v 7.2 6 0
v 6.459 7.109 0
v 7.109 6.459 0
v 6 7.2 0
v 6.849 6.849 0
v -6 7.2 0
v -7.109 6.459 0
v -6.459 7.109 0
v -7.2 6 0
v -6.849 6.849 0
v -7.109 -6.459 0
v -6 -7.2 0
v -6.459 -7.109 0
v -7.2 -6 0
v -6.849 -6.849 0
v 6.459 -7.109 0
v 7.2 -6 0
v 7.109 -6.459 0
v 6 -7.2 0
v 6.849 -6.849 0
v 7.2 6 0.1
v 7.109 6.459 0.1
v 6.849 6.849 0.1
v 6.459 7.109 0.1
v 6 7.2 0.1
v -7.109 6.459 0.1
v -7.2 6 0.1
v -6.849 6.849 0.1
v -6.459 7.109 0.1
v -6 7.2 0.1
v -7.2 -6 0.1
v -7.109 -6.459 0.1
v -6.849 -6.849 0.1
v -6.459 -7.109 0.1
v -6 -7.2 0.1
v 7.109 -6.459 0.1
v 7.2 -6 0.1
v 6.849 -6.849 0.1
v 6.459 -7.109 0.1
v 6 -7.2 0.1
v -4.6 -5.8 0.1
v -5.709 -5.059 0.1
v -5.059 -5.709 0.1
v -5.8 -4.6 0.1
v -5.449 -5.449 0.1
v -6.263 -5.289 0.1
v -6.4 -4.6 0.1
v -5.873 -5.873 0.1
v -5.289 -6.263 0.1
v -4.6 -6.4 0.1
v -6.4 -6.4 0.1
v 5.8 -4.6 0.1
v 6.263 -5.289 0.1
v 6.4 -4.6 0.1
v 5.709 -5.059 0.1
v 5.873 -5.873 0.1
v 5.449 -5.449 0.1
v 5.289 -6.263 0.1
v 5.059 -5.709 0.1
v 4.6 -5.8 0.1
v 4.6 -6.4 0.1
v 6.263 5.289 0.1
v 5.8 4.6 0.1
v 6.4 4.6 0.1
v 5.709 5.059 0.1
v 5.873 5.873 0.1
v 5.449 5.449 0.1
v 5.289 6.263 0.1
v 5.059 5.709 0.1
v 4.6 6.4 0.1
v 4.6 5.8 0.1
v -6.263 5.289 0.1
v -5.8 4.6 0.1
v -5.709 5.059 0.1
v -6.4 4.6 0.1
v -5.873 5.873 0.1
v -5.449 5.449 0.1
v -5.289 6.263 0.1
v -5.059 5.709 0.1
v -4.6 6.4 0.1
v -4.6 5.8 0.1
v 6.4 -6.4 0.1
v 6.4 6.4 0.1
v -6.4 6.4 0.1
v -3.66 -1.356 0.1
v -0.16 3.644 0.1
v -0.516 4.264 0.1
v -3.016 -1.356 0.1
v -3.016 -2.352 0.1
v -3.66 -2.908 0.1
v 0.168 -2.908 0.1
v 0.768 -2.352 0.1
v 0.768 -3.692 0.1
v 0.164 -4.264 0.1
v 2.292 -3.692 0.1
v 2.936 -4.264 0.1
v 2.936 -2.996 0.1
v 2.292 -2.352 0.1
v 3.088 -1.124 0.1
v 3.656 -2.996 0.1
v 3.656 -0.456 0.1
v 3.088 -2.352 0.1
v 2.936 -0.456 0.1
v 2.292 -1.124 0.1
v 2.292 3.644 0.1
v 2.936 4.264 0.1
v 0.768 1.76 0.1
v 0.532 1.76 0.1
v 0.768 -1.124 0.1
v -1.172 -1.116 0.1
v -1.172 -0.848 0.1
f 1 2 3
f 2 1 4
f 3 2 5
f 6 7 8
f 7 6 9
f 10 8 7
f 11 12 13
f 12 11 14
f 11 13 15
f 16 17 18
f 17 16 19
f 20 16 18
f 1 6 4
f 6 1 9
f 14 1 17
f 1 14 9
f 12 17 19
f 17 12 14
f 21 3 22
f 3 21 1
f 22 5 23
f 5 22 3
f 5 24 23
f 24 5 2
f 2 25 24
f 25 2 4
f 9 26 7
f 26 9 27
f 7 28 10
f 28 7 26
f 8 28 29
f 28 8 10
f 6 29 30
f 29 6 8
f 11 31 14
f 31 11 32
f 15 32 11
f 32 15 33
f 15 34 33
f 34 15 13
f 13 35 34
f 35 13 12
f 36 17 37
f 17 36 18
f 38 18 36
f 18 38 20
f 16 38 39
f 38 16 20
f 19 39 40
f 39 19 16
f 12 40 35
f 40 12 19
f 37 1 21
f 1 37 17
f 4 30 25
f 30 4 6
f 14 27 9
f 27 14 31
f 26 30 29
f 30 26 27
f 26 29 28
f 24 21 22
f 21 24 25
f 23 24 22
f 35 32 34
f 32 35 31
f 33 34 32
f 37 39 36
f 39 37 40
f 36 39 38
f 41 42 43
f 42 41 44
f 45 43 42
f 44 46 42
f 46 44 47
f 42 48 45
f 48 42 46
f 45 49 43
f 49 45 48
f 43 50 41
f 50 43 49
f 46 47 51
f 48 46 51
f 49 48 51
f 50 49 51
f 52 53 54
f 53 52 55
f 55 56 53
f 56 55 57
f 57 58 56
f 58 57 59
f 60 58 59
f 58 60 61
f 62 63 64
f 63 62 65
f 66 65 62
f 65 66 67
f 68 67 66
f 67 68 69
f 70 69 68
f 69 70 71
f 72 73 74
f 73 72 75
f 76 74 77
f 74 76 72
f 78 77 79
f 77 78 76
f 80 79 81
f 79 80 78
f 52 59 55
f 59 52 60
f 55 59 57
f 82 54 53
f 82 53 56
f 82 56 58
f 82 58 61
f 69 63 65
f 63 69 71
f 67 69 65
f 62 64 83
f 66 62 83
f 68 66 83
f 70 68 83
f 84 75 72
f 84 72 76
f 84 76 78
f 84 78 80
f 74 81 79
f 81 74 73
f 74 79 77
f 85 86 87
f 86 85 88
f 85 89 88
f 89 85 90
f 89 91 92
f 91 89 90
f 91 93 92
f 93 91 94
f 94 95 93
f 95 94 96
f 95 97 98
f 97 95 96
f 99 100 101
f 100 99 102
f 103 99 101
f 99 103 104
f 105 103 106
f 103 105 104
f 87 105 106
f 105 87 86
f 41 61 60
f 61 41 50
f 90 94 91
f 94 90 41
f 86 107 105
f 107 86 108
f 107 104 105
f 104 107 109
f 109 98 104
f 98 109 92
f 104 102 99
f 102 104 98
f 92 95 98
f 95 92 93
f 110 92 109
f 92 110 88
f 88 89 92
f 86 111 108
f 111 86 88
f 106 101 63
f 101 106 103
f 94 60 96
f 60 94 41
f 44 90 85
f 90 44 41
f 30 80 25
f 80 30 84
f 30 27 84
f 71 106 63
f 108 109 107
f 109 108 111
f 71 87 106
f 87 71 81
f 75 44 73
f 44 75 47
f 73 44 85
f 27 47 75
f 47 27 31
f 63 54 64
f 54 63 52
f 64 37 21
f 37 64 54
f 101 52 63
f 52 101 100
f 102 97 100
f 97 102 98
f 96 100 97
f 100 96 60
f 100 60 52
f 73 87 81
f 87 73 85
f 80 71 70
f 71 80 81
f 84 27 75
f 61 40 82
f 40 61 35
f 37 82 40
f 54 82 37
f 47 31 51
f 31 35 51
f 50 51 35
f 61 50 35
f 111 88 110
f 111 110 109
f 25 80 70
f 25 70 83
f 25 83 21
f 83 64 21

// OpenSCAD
// file: ../p/1-4cyli.scad
use <../lib.scad>
function ldraw_lib__1_4cyli() = [
// 0 Cylinder 0.25
// 0 Name: 1-4cyli.dat
// 0 Author: James Jessiman
// 0 !LDRAW_ORG Primitive UPDATE 2012-01
// 0 !LICENSE Licensed under CC BY 4.0 : see CAreadme.txt
// 
// 0 BFC CERTIFY CCW
  [0,"BFC","CERTIFY"],
  [0,"BFC","CCW"],
// 
// 0 !HISTORY 2002-03-23 [sbliss] Added BFC statement.
// 0 !HISTORY 2002-04-25 [PTadmin] Official Update 2002-02
// 0 !HISTORY 2007-06-22 [PTadmin] Header formatted for Contributor Agreement
// 0 !HISTORY 2008-07-01 [PTadmin] Official Update 2008-01
// 0 !HISTORY 2012-02-16 [Philo] Changed to CCW
// 0 !HISTORY 2012-03-30 [PTadmin] Official Update 2012-01
// 
// 
// 4 16 1 1 0 0.9239 1 0.3827 0.9239 0 0.3827 1 0 0
  [4,16,1,1,0,0.9239,1,0.3827,0.9239,0,0.3827,1,0,0],
// 5 24 1 0 0 1 1 0 0.9239 0 0.3827 1 0 -1
  [5,24,1,0,0,1,1,0,0.9239,0,0.3827,1,0,-1],
// 4 16 0.9239 1 0.3827 0.7071 1 0.7071 0.7071 0 0.7071 0.9239 0 0.3827
  [4,16,0.9239,1,0.3827,0.7071,1,0.7071,0.7071,0,0.7071,0.9239,0,0.3827],
// 5 24 0.9239 0 0.3827 0.9239 1 0.3827 0.7071 0 0.7071 1 0 0
  [5,24,0.9239,0,0.3827,0.9239,1,0.3827,0.7071,0,0.7071,1,0,0],
// 4 16 0.7071 1 0.7071 0.3827 1 0.9239 0.3827 0 0.9239 0.7071 0 0.7071
  [4,16,0.7071,1,0.7071,0.3827,1,0.9239,0.3827,0,0.9239,0.7071,0,0.7071],
// 5 24 0.7071 0 0.7071 0.7071 1 0.7071 0.3827 0 0.9239 0.9239 0 0.3827
  [5,24,0.7071,0,0.7071,0.7071,1,0.7071,0.3827,0,0.9239,0.9239,0,0.3827],
// 4 16 0.3827 1 0.9239 0 1 1 0 0 1 0.3827 0 0.9239
  [4,16,0.3827,1,0.9239,0,1,1,0,0,1,0.3827,0,0.9239],
// 5 24 0.3827 0 0.9239 0.3827 1 0.9239 0 0 1 0.7071 0 0.7071
  [5,24,0.3827,0,0.9239,0.3827,1,0.9239,0,0,1,0.7071,0,0.7071],
// 5 24 0 0 1 0 1 1 0.3827 0 0.9239 -1 0 1
  [5,24,0,0,1,0,1,1,0.3827,0,0.9239,-1,0,1],
];
module ldraw_lib__1_4cyli(step=0, col=false, unit=2/5, alt=false, line=0.2, solid=!$preview)
    makepoly(ldraw_lib__1_4cyli(), step=step, col=col, unit=unit, alt=alt, line=line, solid=solid);
ldraw_lib__1_4cyli(line=0.2);
// file: s/6237277as01.scad
use <../../lib.scad>
use <../../p/1-4chrd.scad>
use <../../p/1-4cyli.scad>
function ldraw_lib__s__6237277as01() = [
// 0 ~Sticker  1.8 x  1.8 without Top Surface
// 0 Name: s\6237277as01.dat
// 0 Author: Alex Herrera [alanbrito98]
// 0 !LDRAW_ORG Subpart UPDATE 2023-04
// 0 !LICENSE Licensed under CC BY 4.0 : see CAreadme.txt
// 
// 0 BFC CERTIFY CCW
  [0,"BFC","CERTIFY"],
  [0,"BFC","CCW"],
// 
// 0 !HISTORY 2023-08-25 [OrionP] Official Update 2023-04
// 
// 
// 0 // Bottom
// 0 // Primitives
// 1 16 15 0 15 3 0 0 0 -1 0 0 0 3 1-4chrd.dat
  [1,16,15,0,15,3,0,0,0,-1,0,0,0,3, ldraw_lib__1_4chrd()],
// 1 16 -15 0 15 -3 0 0 0 -1 0 0 0 3 1-4chrd.dat
  [1,16,-15,0,15,-3,0,0,0,-1,0,0,0,3, ldraw_lib__1_4chrd()],
// 1 16 -15 0 -15 -3 0 0 0 -1 0 0 0 -3 1-4chrd.dat
  [1,16,-15,0,-15,-3,0,0,0,-1,0,0,0,-3, ldraw_lib__1_4chrd()],
// 1 16 15 0 -15 3 0 0 0 -1 0 0 0 -3 1-4chrd.dat
  [1,16,15,0,-15,3,0,0,0,-1,0,0,0,-3, ldraw_lib__1_4chrd()],
// 0 // Bottom Faces
// 4 16 18 0 15 -18 0 15 -15 0 18 15 0 18
  [4,16,18,0,15,-18,0,15,-15,0,18,15,0,18],
// 4 16 -18 0 -15 -18 0 15 18 0 15 18 0 -15
  [4,16,-18,0,-15,-18,0,15,18,0,15,18,0,-15],
// 4 16 15 0 -18 -15 0 -18 -18 0 -15 18 0 -15
  [4,16,15,0,-18,-15,0,-18,-18,0,-15,18,0,-15],
// 0 // Sides
// 0 // Primitives
// 1 16 15 0 15 3 0 0 0 -0.25 0 0 0 3 1-4cyli.dat
  [1,16,15,0,15,3,0,0,0,-0.25,0,0,0,3, ldraw_lib__1_4cyli()],
// 1 16 -15 0 15 -3 0 0 0 -0.25 0 0 0 3 1-4cyli.dat
  [1,16,-15,0,15,-3,0,0,0,-0.25,0,0,0,3, ldraw_lib__1_4cyli()],
// 1 16 -15 0 -15 -3 0 0 0 -0.25 0 0 0 -3 1-4cyli.dat
  [1,16,-15,0,-15,-3,0,0,0,-0.25,0,0,0,-3, ldraw_lib__1_4cyli()],
// 1 16 15 0 -15 3 0 0 0 -0.25 0 0 0 -3 1-4cyli.dat
  [1,16,15,0,-15,3,0,0,0,-0.25,0,0,0,-3, ldraw_lib__1_4cyli()],
// 0 // Side Faces
// 4 16 -15 0 -18 15 0 -18 15 -0.25 -18 -15 -0.25 -18
  [4,16,-15,0,-18,15,0,-18,15,-0.25,-18,-15,-0.25,-18],
// 4 16 18 0 -15 18 0 15 18 -0.25 15 18 -0.25 -15
  [4,16,18,0,-15,18,0,15,18,-0.25,15,18,-0.25,-15],
// 4 16 15 0 18 -15 0 18 -15 -0.25 18 15 -0.25 18
  [4,16,15,0,18,-15,0,18,-15,-0.25,18,15,-0.25,18],
// 4 16 -18 0 15 -18 0 -15 -18 -0.25 -15 -18 -0.25 15
  [4,16,-18,0,15,-18,0,-15,-18,-0.25,-15,-18,-0.25,15],
// 
];
module ldraw_lib__s__6237277as01(step=0, col=false, unit=2/5, alt=false, line=0.2, solid=!$preview)
    makepoly(ldraw_lib__s__6237277as01(), step=step, col=col, unit=unit, alt=alt, line=line, solid=solid);
ldraw_lib__s__6237277as01(line=0.2);
// file: ../p/1-4ring2.scad
use <../lib.scad>
function ldraw_lib__1_4ring2() = [
// 0 Ring  2 x 0.25
// 0 Name: 1-4ring2.dat
// 0 Author: Franklin W. Cain [fwcain]
// 0 !LDRAW_ORG Primitive UPDATE 2015-01
// 0 !LICENSE Licensed under CC BY 4.0 : see CAreadme.txt
// 
// 0 BFC CERTIFY CCW
  [0,"BFC","CERTIFY"],
  [0,"BFC","CCW"],
// 
// 0 !HISTORY 2001-12-31 [PTadmin] Official Update 2001-03
// 0 !HISTORY 2007-06-22 [PTadmin] Header formatted for Contributor Agreement
// 0 !HISTORY 2008-07-01 [PTadmin] Official Update 2008-01
// 0 !HISTORY 2012-02-16 [Philo] Changed to CCW
// 0 !HISTORY 2012-03-30 [PTadmin] Official Update 2012-01
// 0 !HISTORY 2014-12-25 [MMR1988] Fixed a rounding issue
// 0 !HISTORY 2015-10-11 [PTadmin] Official Update 2015-01
// 
// 
// 4 16 3 0 0 2.7717 0 1.1481 1.8478 0 0.7654 2 0 0
  [4,16,3,0,0,2.7717,0,1.1481,1.8478,0,0.7654,2,0,0],
// 4 16 2.7717 0 1.1481 2.1213 0 2.1213 1.4142 0 1.4142 1.8478 0 0.7654
  [4,16,2.7717,0,1.1481,2.1213,0,2.1213,1.4142,0,1.4142,1.8478,0,0.7654],
// 4 16 2.1213 0 2.1213 1.1481 0 2.7717 0.7654 0 1.8478 1.4142 0 1.4142
  [4,16,2.1213,0,2.1213,1.1481,0,2.7717,0.7654,0,1.8478,1.4142,0,1.4142],
// 4 16 1.1481 0 2.7717 0 0 3 0 0 2 0.7654 0 1.8478
  [4,16,1.1481,0,2.7717,0,0,3,0,0,2,0.7654,0,1.8478],
// 0 // Build by Primitive Generator 2
];
module ldraw_lib__1_4ring2(step=0, col=false, unit=2/5, alt=false, line=0.2, solid=!$preview)
    makepoly(ldraw_lib__1_4ring2(), step=step, col=col, unit=unit, alt=alt, line=line, solid=solid);
ldraw_lib__1_4ring2(line=0.2);
// file: ../p/1-4ndis.scad
use <../lib.scad>
function ldraw_lib__1_4ndis() = [
// 0 Disc Negative 0.25
// 0 Name: 1-4ndis.dat
// 0 Author: James Jessiman
// 0 !LDRAW_ORG Primitive UPDATE 2012-01
// 0 !LICENSE Licensed under CC BY 4.0 : see CAreadme.txt
// 
// 0 BFC CERTIFY CCW
  [0,"BFC","CERTIFY"],
  [0,"BFC","CCW"],
// 
// 0 !HISTORY 2002-03-23 [sbliss] Added BFC Statement
// 0 !HISTORY 2002-04-25 [PTadmin] Official Update 2002-02
// 0 !HISTORY 2007-06-22 [PTadmin] Header formatted for Contributor Agreement
// 0 !HISTORY 2008-07-01 [PTadmin] Official Update 2008-01
// 0 !HISTORY 2012-02-16 [Philo] Changed to CCW
// 0 !HISTORY 2012-03-30 [PTadmin] Official Update 2012-01
// 
// 
// 3 16 0.9239 0 0.3827 1 0 0 1 0 1
  [3,16,0.9239,0,0.3827,1,0,0,1,0,1],
// 3 16 0.7071 0 0.7071 0.9239 0 0.3827 1 0 1
  [3,16,0.7071,0,0.7071,0.9239,0,0.3827,1,0,1],
// 3 16 0.3827 0 0.9239 0.7071 0 0.7071 1 0 1
  [3,16,0.3827,0,0.9239,0.7071,0,0.7071,1,0,1],
// 3 16 0 0 1 0.3827 0 0.9239 1 0 1
  [3,16,0,0,1,0.3827,0,0.9239,1,0,1],
];
module ldraw_lib__1_4ndis(step=0, col=false, unit=2/5, alt=false, line=0.2, solid=!$preview)
    makepoly(ldraw_lib__1_4ndis(), step=step, col=col, unit=unit, alt=alt, line=line, solid=solid);
ldraw_lib__1_4ndis(line=0.2);
// file: ../p/1-4chrd.scad
use <../lib.scad>
function ldraw_lib__1_4chrd() = [
// 0 Chord 0.25
// 0 Name: 1-4chrd.dat
// 0 Author: Max Martin Richter [MMR1988]
// 0 !LDRAW_ORG Primitive UPDATE 2023-05
// 0 !LICENSE Licensed under CC BY 4.0 : see CAreadme.txt
// 
// 0 BFC CERTIFY CCW
  [0,"BFC","CERTIFY"],
  [0,"BFC","CCW"],
// 
// 0 !HISTORY 2004-04-22 [PTadmin] Official Update 2004-02
// 0 !HISTORY 2007-10-09 [PTadmin] Header formatted for Contributor Agreement
// 0 !HISTORY 2008-07-01 [PTadmin] Official Update 2008-01
// 0 !HISTORY 2012-08-02 [MMR1988] Re-creation with PrimGen2 and Rectifier
// 0 !HISTORY 2012-08-09 [PTadmin] Official Update 2012-02
// 0 !HISTORY 2023-10-27 [OrionP] Change author to MMR1988 from hafhead
// 0 !HISTORY 2023-10-31 [OrionP] Official Update 2023-05
// 
// 4 16 0.9239 0 0.3827 0.3827 0 0.9239 0 0 1 1 0 0
  [4,16,0.9239,0,0.3827,0.3827,0,0.9239,0,0,1,1,0,0],
// 3 16 0.7071 0 0.7071 0.3827 0 0.9239 0.9239 0 0.3827
  [3,16,0.7071,0,0.7071,0.3827,0,0.9239,0.9239,0,0.3827],
];
module ldraw_lib__1_4chrd(step=0, col=false, unit=2/5, alt=false, line=0.2, solid=!$preview)
    makepoly(ldraw_lib__1_4chrd(), step=step, col=col, unit=unit, alt=alt, line=line, solid=solid);
ldraw_lib__1_4chrd(line=0.2);
// main file
use <../lib.scad>
use <../p/1-4chrd.scad>
use <../p/1-4ndis.scad>
use <../p/1-4ring2.scad>
use <s/6237277as01.scad>
function ldraw_lib__6237277d() = [
// 0 Sticker  1.8 x  1.8 with White "4" on Red Panel on Yellow Background
// 0 Name: 6237277d.dat
// 0 Author: Alex Herrera [alanbrito98]
// 0 !LDRAW_ORG Part UPDATE 2024-03
// 0 !LICENSE Licensed under CC BY 4.0 : see CAreadme.txt
// 
// 0 BFC CERTIFY CCW
  [0,"BFC","CERTIFY"],
  [0,"BFC","CCW"],
// 
// 0 !KEYWORDS Bricklink 21311stk01, Brickowl 227694, Rebrickable 39754, set 21311
// 0 !KEYWORDS Voltron
// 
// 0 !HISTORY 2021-11-30 [MagFors] centered the digit
// 0 !HISTORY 2024-04-28 [OrionP] Official Update 2024-03
// 
// 
// 0 // Box
// 1 16 0 0 0 1 0 0 0 1 0 0 0 1 s\6237277as01.dat
  [1,16,0,0,0,1,0,0,0,1,0,0,0,1, ldraw_lib__s__6237277as01()],
// 0 // Primitives
// 1 14 -15 -0.25 15 -3 0 0 0 1 0 0 0 3 1-4chrd.dat
  [1,14,-15,-0.25,15,-3,0,0,0,1,0,0,0,3, ldraw_lib__1_4chrd()],
// 1 14 15 -0.25 15 3 0 0 0 1 0 0 0 3 1-4chrd.dat
  [1,14,15,-0.25,15,3,0,0,0,1,0,0,0,3, ldraw_lib__1_4chrd()],
// 1 14 -15 -0.25 -15 -3 0 0 0 1 0 0 0 -3 1-4chrd.dat
  [1,14,-15,-0.25,-15,-3,0,0,0,1,0,0,0,-3, ldraw_lib__1_4chrd()],
// 1 14 15 -0.25 -15 3 0 0 0 1 0 0 0 -3 1-4chrd.dat
  [1,14,15,-0.25,-15,3,0,0,0,1,0,0,0,-3, ldraw_lib__1_4chrd()],
// 1 4 -11.5 -0.25 -11.5 -3 0 0 0 1 0 0 0 -3 1-4chrd.dat
  [1,4,-11.5,-0.25,-11.5,-3,0,0,0,1,0,0,0,-3, ldraw_lib__1_4chrd()],
// 1 0 -11.5 -0.25 -11.5 -1.5 0 0 0 1 0 0 0 -1.5 1-4ring2.dat
  [1,0,-11.5,-0.25,-11.5,-1.5,0,0,0,1,0,0,0,-1.5, ldraw_lib__1_4ring2()],
// 1 14 -11.5 -0.25 -11.5 -4.5 0 0 0 1 0 0 0 -4.5 1-4ndis.dat
  [1,14,-11.5,-0.25,-11.5,-4.5,0,0,0,1,0,0,0,-4.5, ldraw_lib__1_4ndis()],
// 1 0 11.5 -0.25 -11.5 1.5 0 0 0 1 0 0 0 -1.5 1-4ring2.dat
  [1,0,11.5,-0.25,-11.5,1.5,0,0,0,1,0,0,0,-1.5, ldraw_lib__1_4ring2()],
// 1 0 11.5 -0.25 11.5 1.5 0 0 0 1 0 0 0 1.5 1-4ring2.dat
  [1,0,11.5,-0.25,11.5,1.5,0,0,0,1,0,0,0,1.5, ldraw_lib__1_4ring2()],
// 1 0 -11.5 -0.25 11.5 -1.5 0 0 0 1 0 0 0 1.5 1-4ring2.dat
  [1,0,-11.5,-0.25,11.5,-1.5,0,0,0,1,0,0,0,1.5, ldraw_lib__1_4ring2()],
// 1 4 11.5 -0.25 -11.5 3 0 0 0 1 0 0 0 -3 1-4chrd.dat
  [1,4,11.5,-0.25,-11.5,3,0,0,0,1,0,0,0,-3, ldraw_lib__1_4chrd()],
// 1 14 11.5 -0.25 -11.5 4.5 0 0 0 1 0 0 0 -4.5 1-4ndis.dat
  [1,14,11.5,-0.25,-11.5,4.5,0,0,0,1,0,0,0,-4.5, ldraw_lib__1_4ndis()],
// 1 4 11.5 -0.25 11.5 3 0 0 0 1 0 0 0 3 1-4chrd.dat
  [1,4,11.5,-0.25,11.5,3,0,0,0,1,0,0,0,3, ldraw_lib__1_4chrd()],
// 1 14 11.5 -0.25 11.5 4.5 0 0 0 1 0 0 0 4.5 1-4ndis.dat
  [1,14,11.5,-0.25,11.5,4.5,0,0,0,1,0,0,0,4.5, ldraw_lib__1_4ndis()],
// 1 14 -11.5 -0.25 11.5 -4.5 0 0 0 1 0 0 0 4.5 1-4ndis.dat
  [1,14,-11.5,-0.25,11.5,-4.5,0,0,0,1,0,0,0,4.5, ldraw_lib__1_4ndis()],
// 1 4 -11.5 -0.25 11.5 -3 0 0 0 1 0 0 0 3 1-4chrd.dat
  [1,4,-11.5,-0.25,11.5,-3,0,0,0,1,0,0,0,3, ldraw_lib__1_4chrd()],
// 4 0 -7.54 -.25 -3.39 -.4 -.25 9.11 -1.29 -.25 10.66 -9.15 -.25 -3.39
  [4,0,-7.54,-.25,-3.39,-.4,-.25,9.11,-1.29,-.25,10.66,-9.15,-.25,-3.39],
// 4 0 -7.54 -.25 -3.39 -9.15 -.25 -3.39 -9.15 -.25 -7.27 -7.54 -.25 -5.88
  [4,0,-7.54,-.25,-3.39,-9.15,-.25,-3.39,-9.15,-.25,-7.27,-7.54,-.25,-5.88],
// 4 0 -7.54 -.25 -5.88 -9.15 -.25 -7.27 .42 -.25 -7.27 1.92 -.25 -5.88
  [4,0,-7.54,-.25,-5.88,-9.15,-.25,-7.27,.42,-.25,-7.27,1.92,-.25,-5.88],
// 4 0 1.92 -.25 -5.88 .42 -.25 -7.27 .41 -.25 -10.66 1.92 -.25 -9.23
  [4,0,1.92,-.25,-5.88,.42,-.25,-7.27,.41,-.25,-10.66,1.92,-.25,-9.23],
// 4 0 1.92 -.25 -9.23 .41 -.25 -10.66 7.34 -.25 -10.66 5.73 -.25 -9.23
  [4,0,1.92,-.25,-9.23,.41,-.25,-10.66,7.34,-.25,-10.66,5.73,-.25,-9.23],
// 4 0 5.73 -.25 -5.88 5.73 -.25 -9.23 7.34 -.25 -10.66 7.34 -.25 -7.49
  [4,0,5.73,-.25,-5.88,5.73,-.25,-9.23,7.34,-.25,-10.66,7.34,-.25,-7.49],
// 4 0 9.14 -.25 -1.14 7.72 -.25 -2.81 7.72 -.25 -5.88 9.14 -.25 -7.49
  [4,0,9.14,-.25,-1.14,7.72,-.25,-2.81,7.72,-.25,-5.88,9.14,-.25,-7.49],
// 4 0 7.72 -.25 -2.81 9.14 -.25 -1.14 7.34 -.25 -1.14 5.73 -.25 -2.81
  [4,0,7.72,-.25,-2.81,9.14,-.25,-1.14,7.34,-.25,-1.14,5.73,-.25,-2.81],
// 4 0 5.73 -.25 9.11 5.73 -.25 -2.81 7.34 -.25 -1.14 7.34 -.25 10.66
  [4,0,5.73,-.25,9.11,5.73,-.25,-2.81,7.34,-.25,-1.14,7.34,-.25,10.66],
// 4 0 5.73 -.25 9.11 7.34 -.25 10.66 -1.29 -.25 10.66 -.4 -.25 9.11
  [4,0,5.73,-.25,9.11,7.34,-.25,10.66,-1.29,-.25,10.66,-.4,-.25,9.11],
// 4 0 -11.5 -0.25 -14.5 -11.5 -0.25 -16 11.5 -0.25 -16 11.5 -0.25 -14.5
  [4,0,-11.5,-0.25,-14.5,-11.5,-0.25,-16,11.5,-0.25,-16,11.5,-0.25,-14.5],
// 4 4 -9.15 -.25 -7.27 -11.5 -.25 -14.5 .41 -.25 -10.66 .42 -.25 -7.27
  [4,4,-9.15,-.25,-7.27,-11.5,-.25,-14.5,.41,-.25,-10.66,.42,-.25,-7.27],
// 4 15 -.4 -.25 9.11 1.33 -.25 4.4 1.92 -.25 4.4 5.73 -.25 9.11
  [4,15,-.4,-.25,9.11,1.33,-.25,4.4,1.92,-.25,4.4,5.73,-.25,9.11],
// 4 15 1.92 -.25 4.4 1.92 -.25 -2.81 5.73 -.25 -2.81 5.73 -.25 9.11
  [4,15,1.92,-.25,4.4,1.92,-.25,-2.81,5.73,-.25,-2.81,5.73,-.25,9.11],
// 4 15 1.92 -.25 -2.81 1.92 -.25 -5.88 5.73 -.25 -5.88 5.73 -.25 -2.81
  [4,15,1.92,-.25,-2.81,1.92,-.25,-5.88,5.73,-.25,-5.88,5.73,-.25,-2.81],
// 4 15 7.72 -.25 -2.81 5.73 -.25 -2.81 5.73 -.25 -5.88 7.72 -.25 -5.88
  [4,15,7.72,-.25,-2.81,5.73,-.25,-2.81,5.73,-.25,-5.88,7.72,-.25,-5.88],
// 4 15 1.92 -.25 -5.88 1.92 -.25 -9.23 5.73 -.25 -9.23 5.73 -.25 -5.88
  [4,15,1.92,-.25,-5.88,1.92,-.25,-9.23,5.73,-.25,-9.23,5.73,-.25,-5.88],
// 4 15 1.92 -.25 -5.88 1.92 -.25 -2.81 -2.93 -.25 -2.79 -7.54 -.25 -3.39
  [4,15,1.92,-.25,-5.88,1.92,-.25,-2.81,-2.93,-.25,-2.79,-7.54,-.25,-3.39],
// 3 15 -7.54 -.25 -3.39 -7.54 -.25 -5.88 1.92 -.25 -5.88
  [3,15,-7.54,-.25,-3.39,-7.54,-.25,-5.88,1.92,-.25,-5.88],
// 4 15 -2.93 -.25 -2.12 1.33 -.25 4.4 -.4 -.25 9.11 -7.54 -.25 -3.39
  [4,15,-2.93,-.25,-2.12,1.33,-.25,4.4,-.4,-.25,9.11,-7.54,-.25,-3.39],
// 4 4 9.14 -.25 -1.14 14.5 -.25 11.5 7.34 -.25 10.66 7.34 -.25 -1.14
  [4,4,9.14,-.25,-1.14,14.5,-.25,11.5,7.34,-.25,10.66,7.34,-.25,-1.14],
// 4 4 7.34 -.25 -10.66 .41 -.25 -10.66 -11.5 -.25 -14.5 11.5 -.25 -14.5
  [4,4,7.34,-.25,-10.66,.41,-.25,-10.66,-11.5,-.25,-14.5,11.5,-.25,-14.5],
// 4 4 -14.5 -.25 -11.5 -11.5 -.25 -14.5 -9.15 -.25 -7.27 -9.15 -.25 -3.39
  [4,4,-14.5,-.25,-11.5,-11.5,-.25,-14.5,-9.15,-.25,-7.27,-9.15,-.25,-3.39],
// 4 14 -15 -0.25 18 -16 -0.25 16 -11.5 -0.25 16 15 -0.25 18
  [4,14,-15,-0.25,18,-16,-0.25,16,-11.5,-0.25,16,15,-0.25,18],
// 3 14 -15 -0.25 18 -18 -0.25 15 -16 -0.25 16
  [3,14,-15,-0.25,18,-18,-0.25,15,-16,-0.25,16],
// 3 4 11.5 -.25 14.5 7.34 -.25 10.66 14.5 -.25 11.5
  [3,4,11.5,-.25,14.5,7.34,-.25,10.66,14.5,-.25,11.5],
// 4 0 1.92 -.25 -2.81 1.92 -.25 4.4 1.33 -.25 4.4 -2.93 -.25 -2.12
  [4,0,1.92,-.25,-2.81,1.92,-.25,4.4,1.33,-.25,4.4,-2.93,-.25,-2.12],
// 4 4 -1.29 -.25 10.66 7.34 -.25 10.66 11.5 -.25 14.5 -11.5 -.25 14.5
  [4,4,-1.29,-.25,10.66,7.34,-.25,10.66,11.5,-.25,14.5,-11.5,-.25,14.5],
// 4 0 -14.5 -0.25 -11.5 -14.5 -0.25 11.5 -16 -0.25 11.5 -16 -0.25 -11.5
  [4,0,-14.5,-0.25,-11.5,-14.5,-0.25,11.5,-16,-0.25,11.5,-16,-0.25,-11.5],
// 3 4 -14.5 -.25 11.5 -14.5 -.25 -11.5 -9.15 -.25 -3.39
  [3,4,-14.5,-.25,11.5,-14.5,-.25,-11.5,-9.15,-.25,-3.39],
// 4 14 -16 -0.25 -11.5 -16 -0.25 11.5 -18 -0.25 15 -18 -0.25 -15
  [4,14,-16,-0.25,-11.5,-16,-0.25,11.5,-18,-0.25,15,-18,-0.25,-15],
// 4 0 14.5 -0.25 11.5 14.5 -0.25 -11.5 16 -0.25 -11.5 16 -0.25 11.5
  [4,0,14.5,-0.25,11.5,14.5,-0.25,-11.5,16,-0.25,-11.5,16,-0.25,11.5],
// 4 14 18 -0.25 15 16 -0.25 11.5 16 -0.25 -11.5 18 -0.25 -15
  [4,14,18,-0.25,15,16,-0.25,11.5,16,-0.25,-11.5,18,-0.25,-15],
// 4 4 9.14 -.25 -7.49 14.5 -.25 -11.5 14.5 -.25 11.5 9.14 -.25 -1.14
  [4,4,9.14,-.25,-7.49,14.5,-.25,-11.5,14.5,-.25,11.5,9.14,-.25,-1.14],
// 4 0 7.72 -.25 -5.88 5.73 -.25 -5.88 7.34 -.25 -7.49 9.14 -.25 -7.49
  [4,0,7.72,-.25,-5.88,5.73,-.25,-5.88,7.34,-.25,-7.49,9.14,-.25,-7.49],
// 4 4 7.34 -.25 -7.49 7.34 -.25 -10.66 11.5 -.25 -14.5 9.14 -.25 -7.49
  [4,4,7.34,-.25,-7.49,7.34,-.25,-10.66,11.5,-.25,-14.5,9.14,-.25,-7.49],
// 3 4 9.14 -.25 -7.49 11.5 -.25 -14.5 14.5 -.25 -11.5
  [3,4,9.14,-.25,-7.49,11.5,-.25,-14.5,14.5,-.25,-11.5],
// 4 4 -14.5 -.25 11.5 -9.15 -.25 -3.39 -1.29 -.25 10.66 -11.5 -.25 14.5
  [4,4,-14.5,-.25,11.5,-9.15,-.25,-3.39,-1.29,-.25,10.66,-11.5,-.25,14.5],
// 4 0 -11.5 -0.25 16 -11.5 -0.25 14.5 11.5 -0.25 14.5 11.5 -0.25 16
  [4,0,-11.5,-0.25,16,-11.5,-0.25,14.5,11.5,-0.25,14.5,11.5,-0.25,16],
// 3 14 -16 -0.25 16 -18 -0.25 15 -16 -0.25 11.5
  [3,14,-16,-0.25,16,-18,-0.25,15,-16,-0.25,11.5],
// 4 14 15 -0.25 -18 16 -0.25 -16 11.5 -0.25 -16 -15 -0.25 -18
  [4,14,15,-0.25,-18,16,-0.25,-16,11.5,-0.25,-16,-15,-0.25,-18],
// 3 14 18 -0.25 -15 16 -0.25 -16 15 -0.25 -18
  [3,14,18,-0.25,-15,16,-0.25,-16,15,-0.25,-18],
// 3 14 16 -0.25 -11.5 16 -0.25 -16 18 -0.25 -15
  [3,14,16,-0.25,-11.5,16,-0.25,-16,18,-0.25,-15],
// 3 14 -16 -0.25 -11.5 -18 -0.25 -15 -16 -0.25 -16
  [3,14,-16,-0.25,-11.5,-18,-0.25,-15,-16,-0.25,-16],
// 3 14 -18 -0.25 -15 -15 -0.25 -18 -16 -0.25 -16
  [3,14,-18,-0.25,-15,-15,-0.25,-18,-16,-0.25,-16],
// 3 14 -11.5 -0.25 -16 -16 -0.25 -16 -15 -0.25 -18
  [3,14,-11.5,-0.25,-16,-16,-0.25,-16,-15,-0.25,-18],
// 3 14 11.5 -0.25 -16 -11.5 -0.25 -16 -15 -0.25 -18
  [3,14,11.5,-0.25,-16,-11.5,-0.25,-16,-15,-0.25,-18],
// 3 15 -2.93 -.25 -2.12 -7.54 -.25 -3.39 -2.93 -.25 -2.79
  [3,15,-2.93,-.25,-2.12,-7.54,-.25,-3.39,-2.93,-.25,-2.79],
// 3 0 -2.93 -.25 -2.12 -2.93 -.25 -2.79 1.92 -.25 -2.81
  [3,0,-2.93,-.25,-2.12,-2.93,-.25,-2.79,1.92,-.25,-2.81],
// 3 14 15 -0.25 18 -11.5 -0.25 16 11.5 -0.25 16
  [3,14,15,-0.25,18,-11.5,-0.25,16,11.5,-0.25,16],
// 3 14 15 -0.25 18 11.5 -0.25 16 16 -0.25 16
  [3,14,15,-0.25,18,11.5,-0.25,16,16,-0.25,16],
// 3 14 15 -0.25 18 16 -0.25 16 18 -0.25 15
  [3,14,15,-0.25,18,16,-0.25,16,18,-0.25,15],
// 3 14 16 -0.25 16 16 -0.25 11.5 18 -0.25 15
  [3,14,16,-0.25,16,16,-0.25,11.5,18,-0.25,15],
];
module ldraw_lib__6237277d(step=0, col=false, unit=2/5, alt=false, line=0.2, solid=!$preview)
    makepoly(ldraw_lib__6237277d(), step=step, col=col, unit=unit, alt=alt, line=line, solid=solid);
ldraw_lib__6237277d(line=0.2);
